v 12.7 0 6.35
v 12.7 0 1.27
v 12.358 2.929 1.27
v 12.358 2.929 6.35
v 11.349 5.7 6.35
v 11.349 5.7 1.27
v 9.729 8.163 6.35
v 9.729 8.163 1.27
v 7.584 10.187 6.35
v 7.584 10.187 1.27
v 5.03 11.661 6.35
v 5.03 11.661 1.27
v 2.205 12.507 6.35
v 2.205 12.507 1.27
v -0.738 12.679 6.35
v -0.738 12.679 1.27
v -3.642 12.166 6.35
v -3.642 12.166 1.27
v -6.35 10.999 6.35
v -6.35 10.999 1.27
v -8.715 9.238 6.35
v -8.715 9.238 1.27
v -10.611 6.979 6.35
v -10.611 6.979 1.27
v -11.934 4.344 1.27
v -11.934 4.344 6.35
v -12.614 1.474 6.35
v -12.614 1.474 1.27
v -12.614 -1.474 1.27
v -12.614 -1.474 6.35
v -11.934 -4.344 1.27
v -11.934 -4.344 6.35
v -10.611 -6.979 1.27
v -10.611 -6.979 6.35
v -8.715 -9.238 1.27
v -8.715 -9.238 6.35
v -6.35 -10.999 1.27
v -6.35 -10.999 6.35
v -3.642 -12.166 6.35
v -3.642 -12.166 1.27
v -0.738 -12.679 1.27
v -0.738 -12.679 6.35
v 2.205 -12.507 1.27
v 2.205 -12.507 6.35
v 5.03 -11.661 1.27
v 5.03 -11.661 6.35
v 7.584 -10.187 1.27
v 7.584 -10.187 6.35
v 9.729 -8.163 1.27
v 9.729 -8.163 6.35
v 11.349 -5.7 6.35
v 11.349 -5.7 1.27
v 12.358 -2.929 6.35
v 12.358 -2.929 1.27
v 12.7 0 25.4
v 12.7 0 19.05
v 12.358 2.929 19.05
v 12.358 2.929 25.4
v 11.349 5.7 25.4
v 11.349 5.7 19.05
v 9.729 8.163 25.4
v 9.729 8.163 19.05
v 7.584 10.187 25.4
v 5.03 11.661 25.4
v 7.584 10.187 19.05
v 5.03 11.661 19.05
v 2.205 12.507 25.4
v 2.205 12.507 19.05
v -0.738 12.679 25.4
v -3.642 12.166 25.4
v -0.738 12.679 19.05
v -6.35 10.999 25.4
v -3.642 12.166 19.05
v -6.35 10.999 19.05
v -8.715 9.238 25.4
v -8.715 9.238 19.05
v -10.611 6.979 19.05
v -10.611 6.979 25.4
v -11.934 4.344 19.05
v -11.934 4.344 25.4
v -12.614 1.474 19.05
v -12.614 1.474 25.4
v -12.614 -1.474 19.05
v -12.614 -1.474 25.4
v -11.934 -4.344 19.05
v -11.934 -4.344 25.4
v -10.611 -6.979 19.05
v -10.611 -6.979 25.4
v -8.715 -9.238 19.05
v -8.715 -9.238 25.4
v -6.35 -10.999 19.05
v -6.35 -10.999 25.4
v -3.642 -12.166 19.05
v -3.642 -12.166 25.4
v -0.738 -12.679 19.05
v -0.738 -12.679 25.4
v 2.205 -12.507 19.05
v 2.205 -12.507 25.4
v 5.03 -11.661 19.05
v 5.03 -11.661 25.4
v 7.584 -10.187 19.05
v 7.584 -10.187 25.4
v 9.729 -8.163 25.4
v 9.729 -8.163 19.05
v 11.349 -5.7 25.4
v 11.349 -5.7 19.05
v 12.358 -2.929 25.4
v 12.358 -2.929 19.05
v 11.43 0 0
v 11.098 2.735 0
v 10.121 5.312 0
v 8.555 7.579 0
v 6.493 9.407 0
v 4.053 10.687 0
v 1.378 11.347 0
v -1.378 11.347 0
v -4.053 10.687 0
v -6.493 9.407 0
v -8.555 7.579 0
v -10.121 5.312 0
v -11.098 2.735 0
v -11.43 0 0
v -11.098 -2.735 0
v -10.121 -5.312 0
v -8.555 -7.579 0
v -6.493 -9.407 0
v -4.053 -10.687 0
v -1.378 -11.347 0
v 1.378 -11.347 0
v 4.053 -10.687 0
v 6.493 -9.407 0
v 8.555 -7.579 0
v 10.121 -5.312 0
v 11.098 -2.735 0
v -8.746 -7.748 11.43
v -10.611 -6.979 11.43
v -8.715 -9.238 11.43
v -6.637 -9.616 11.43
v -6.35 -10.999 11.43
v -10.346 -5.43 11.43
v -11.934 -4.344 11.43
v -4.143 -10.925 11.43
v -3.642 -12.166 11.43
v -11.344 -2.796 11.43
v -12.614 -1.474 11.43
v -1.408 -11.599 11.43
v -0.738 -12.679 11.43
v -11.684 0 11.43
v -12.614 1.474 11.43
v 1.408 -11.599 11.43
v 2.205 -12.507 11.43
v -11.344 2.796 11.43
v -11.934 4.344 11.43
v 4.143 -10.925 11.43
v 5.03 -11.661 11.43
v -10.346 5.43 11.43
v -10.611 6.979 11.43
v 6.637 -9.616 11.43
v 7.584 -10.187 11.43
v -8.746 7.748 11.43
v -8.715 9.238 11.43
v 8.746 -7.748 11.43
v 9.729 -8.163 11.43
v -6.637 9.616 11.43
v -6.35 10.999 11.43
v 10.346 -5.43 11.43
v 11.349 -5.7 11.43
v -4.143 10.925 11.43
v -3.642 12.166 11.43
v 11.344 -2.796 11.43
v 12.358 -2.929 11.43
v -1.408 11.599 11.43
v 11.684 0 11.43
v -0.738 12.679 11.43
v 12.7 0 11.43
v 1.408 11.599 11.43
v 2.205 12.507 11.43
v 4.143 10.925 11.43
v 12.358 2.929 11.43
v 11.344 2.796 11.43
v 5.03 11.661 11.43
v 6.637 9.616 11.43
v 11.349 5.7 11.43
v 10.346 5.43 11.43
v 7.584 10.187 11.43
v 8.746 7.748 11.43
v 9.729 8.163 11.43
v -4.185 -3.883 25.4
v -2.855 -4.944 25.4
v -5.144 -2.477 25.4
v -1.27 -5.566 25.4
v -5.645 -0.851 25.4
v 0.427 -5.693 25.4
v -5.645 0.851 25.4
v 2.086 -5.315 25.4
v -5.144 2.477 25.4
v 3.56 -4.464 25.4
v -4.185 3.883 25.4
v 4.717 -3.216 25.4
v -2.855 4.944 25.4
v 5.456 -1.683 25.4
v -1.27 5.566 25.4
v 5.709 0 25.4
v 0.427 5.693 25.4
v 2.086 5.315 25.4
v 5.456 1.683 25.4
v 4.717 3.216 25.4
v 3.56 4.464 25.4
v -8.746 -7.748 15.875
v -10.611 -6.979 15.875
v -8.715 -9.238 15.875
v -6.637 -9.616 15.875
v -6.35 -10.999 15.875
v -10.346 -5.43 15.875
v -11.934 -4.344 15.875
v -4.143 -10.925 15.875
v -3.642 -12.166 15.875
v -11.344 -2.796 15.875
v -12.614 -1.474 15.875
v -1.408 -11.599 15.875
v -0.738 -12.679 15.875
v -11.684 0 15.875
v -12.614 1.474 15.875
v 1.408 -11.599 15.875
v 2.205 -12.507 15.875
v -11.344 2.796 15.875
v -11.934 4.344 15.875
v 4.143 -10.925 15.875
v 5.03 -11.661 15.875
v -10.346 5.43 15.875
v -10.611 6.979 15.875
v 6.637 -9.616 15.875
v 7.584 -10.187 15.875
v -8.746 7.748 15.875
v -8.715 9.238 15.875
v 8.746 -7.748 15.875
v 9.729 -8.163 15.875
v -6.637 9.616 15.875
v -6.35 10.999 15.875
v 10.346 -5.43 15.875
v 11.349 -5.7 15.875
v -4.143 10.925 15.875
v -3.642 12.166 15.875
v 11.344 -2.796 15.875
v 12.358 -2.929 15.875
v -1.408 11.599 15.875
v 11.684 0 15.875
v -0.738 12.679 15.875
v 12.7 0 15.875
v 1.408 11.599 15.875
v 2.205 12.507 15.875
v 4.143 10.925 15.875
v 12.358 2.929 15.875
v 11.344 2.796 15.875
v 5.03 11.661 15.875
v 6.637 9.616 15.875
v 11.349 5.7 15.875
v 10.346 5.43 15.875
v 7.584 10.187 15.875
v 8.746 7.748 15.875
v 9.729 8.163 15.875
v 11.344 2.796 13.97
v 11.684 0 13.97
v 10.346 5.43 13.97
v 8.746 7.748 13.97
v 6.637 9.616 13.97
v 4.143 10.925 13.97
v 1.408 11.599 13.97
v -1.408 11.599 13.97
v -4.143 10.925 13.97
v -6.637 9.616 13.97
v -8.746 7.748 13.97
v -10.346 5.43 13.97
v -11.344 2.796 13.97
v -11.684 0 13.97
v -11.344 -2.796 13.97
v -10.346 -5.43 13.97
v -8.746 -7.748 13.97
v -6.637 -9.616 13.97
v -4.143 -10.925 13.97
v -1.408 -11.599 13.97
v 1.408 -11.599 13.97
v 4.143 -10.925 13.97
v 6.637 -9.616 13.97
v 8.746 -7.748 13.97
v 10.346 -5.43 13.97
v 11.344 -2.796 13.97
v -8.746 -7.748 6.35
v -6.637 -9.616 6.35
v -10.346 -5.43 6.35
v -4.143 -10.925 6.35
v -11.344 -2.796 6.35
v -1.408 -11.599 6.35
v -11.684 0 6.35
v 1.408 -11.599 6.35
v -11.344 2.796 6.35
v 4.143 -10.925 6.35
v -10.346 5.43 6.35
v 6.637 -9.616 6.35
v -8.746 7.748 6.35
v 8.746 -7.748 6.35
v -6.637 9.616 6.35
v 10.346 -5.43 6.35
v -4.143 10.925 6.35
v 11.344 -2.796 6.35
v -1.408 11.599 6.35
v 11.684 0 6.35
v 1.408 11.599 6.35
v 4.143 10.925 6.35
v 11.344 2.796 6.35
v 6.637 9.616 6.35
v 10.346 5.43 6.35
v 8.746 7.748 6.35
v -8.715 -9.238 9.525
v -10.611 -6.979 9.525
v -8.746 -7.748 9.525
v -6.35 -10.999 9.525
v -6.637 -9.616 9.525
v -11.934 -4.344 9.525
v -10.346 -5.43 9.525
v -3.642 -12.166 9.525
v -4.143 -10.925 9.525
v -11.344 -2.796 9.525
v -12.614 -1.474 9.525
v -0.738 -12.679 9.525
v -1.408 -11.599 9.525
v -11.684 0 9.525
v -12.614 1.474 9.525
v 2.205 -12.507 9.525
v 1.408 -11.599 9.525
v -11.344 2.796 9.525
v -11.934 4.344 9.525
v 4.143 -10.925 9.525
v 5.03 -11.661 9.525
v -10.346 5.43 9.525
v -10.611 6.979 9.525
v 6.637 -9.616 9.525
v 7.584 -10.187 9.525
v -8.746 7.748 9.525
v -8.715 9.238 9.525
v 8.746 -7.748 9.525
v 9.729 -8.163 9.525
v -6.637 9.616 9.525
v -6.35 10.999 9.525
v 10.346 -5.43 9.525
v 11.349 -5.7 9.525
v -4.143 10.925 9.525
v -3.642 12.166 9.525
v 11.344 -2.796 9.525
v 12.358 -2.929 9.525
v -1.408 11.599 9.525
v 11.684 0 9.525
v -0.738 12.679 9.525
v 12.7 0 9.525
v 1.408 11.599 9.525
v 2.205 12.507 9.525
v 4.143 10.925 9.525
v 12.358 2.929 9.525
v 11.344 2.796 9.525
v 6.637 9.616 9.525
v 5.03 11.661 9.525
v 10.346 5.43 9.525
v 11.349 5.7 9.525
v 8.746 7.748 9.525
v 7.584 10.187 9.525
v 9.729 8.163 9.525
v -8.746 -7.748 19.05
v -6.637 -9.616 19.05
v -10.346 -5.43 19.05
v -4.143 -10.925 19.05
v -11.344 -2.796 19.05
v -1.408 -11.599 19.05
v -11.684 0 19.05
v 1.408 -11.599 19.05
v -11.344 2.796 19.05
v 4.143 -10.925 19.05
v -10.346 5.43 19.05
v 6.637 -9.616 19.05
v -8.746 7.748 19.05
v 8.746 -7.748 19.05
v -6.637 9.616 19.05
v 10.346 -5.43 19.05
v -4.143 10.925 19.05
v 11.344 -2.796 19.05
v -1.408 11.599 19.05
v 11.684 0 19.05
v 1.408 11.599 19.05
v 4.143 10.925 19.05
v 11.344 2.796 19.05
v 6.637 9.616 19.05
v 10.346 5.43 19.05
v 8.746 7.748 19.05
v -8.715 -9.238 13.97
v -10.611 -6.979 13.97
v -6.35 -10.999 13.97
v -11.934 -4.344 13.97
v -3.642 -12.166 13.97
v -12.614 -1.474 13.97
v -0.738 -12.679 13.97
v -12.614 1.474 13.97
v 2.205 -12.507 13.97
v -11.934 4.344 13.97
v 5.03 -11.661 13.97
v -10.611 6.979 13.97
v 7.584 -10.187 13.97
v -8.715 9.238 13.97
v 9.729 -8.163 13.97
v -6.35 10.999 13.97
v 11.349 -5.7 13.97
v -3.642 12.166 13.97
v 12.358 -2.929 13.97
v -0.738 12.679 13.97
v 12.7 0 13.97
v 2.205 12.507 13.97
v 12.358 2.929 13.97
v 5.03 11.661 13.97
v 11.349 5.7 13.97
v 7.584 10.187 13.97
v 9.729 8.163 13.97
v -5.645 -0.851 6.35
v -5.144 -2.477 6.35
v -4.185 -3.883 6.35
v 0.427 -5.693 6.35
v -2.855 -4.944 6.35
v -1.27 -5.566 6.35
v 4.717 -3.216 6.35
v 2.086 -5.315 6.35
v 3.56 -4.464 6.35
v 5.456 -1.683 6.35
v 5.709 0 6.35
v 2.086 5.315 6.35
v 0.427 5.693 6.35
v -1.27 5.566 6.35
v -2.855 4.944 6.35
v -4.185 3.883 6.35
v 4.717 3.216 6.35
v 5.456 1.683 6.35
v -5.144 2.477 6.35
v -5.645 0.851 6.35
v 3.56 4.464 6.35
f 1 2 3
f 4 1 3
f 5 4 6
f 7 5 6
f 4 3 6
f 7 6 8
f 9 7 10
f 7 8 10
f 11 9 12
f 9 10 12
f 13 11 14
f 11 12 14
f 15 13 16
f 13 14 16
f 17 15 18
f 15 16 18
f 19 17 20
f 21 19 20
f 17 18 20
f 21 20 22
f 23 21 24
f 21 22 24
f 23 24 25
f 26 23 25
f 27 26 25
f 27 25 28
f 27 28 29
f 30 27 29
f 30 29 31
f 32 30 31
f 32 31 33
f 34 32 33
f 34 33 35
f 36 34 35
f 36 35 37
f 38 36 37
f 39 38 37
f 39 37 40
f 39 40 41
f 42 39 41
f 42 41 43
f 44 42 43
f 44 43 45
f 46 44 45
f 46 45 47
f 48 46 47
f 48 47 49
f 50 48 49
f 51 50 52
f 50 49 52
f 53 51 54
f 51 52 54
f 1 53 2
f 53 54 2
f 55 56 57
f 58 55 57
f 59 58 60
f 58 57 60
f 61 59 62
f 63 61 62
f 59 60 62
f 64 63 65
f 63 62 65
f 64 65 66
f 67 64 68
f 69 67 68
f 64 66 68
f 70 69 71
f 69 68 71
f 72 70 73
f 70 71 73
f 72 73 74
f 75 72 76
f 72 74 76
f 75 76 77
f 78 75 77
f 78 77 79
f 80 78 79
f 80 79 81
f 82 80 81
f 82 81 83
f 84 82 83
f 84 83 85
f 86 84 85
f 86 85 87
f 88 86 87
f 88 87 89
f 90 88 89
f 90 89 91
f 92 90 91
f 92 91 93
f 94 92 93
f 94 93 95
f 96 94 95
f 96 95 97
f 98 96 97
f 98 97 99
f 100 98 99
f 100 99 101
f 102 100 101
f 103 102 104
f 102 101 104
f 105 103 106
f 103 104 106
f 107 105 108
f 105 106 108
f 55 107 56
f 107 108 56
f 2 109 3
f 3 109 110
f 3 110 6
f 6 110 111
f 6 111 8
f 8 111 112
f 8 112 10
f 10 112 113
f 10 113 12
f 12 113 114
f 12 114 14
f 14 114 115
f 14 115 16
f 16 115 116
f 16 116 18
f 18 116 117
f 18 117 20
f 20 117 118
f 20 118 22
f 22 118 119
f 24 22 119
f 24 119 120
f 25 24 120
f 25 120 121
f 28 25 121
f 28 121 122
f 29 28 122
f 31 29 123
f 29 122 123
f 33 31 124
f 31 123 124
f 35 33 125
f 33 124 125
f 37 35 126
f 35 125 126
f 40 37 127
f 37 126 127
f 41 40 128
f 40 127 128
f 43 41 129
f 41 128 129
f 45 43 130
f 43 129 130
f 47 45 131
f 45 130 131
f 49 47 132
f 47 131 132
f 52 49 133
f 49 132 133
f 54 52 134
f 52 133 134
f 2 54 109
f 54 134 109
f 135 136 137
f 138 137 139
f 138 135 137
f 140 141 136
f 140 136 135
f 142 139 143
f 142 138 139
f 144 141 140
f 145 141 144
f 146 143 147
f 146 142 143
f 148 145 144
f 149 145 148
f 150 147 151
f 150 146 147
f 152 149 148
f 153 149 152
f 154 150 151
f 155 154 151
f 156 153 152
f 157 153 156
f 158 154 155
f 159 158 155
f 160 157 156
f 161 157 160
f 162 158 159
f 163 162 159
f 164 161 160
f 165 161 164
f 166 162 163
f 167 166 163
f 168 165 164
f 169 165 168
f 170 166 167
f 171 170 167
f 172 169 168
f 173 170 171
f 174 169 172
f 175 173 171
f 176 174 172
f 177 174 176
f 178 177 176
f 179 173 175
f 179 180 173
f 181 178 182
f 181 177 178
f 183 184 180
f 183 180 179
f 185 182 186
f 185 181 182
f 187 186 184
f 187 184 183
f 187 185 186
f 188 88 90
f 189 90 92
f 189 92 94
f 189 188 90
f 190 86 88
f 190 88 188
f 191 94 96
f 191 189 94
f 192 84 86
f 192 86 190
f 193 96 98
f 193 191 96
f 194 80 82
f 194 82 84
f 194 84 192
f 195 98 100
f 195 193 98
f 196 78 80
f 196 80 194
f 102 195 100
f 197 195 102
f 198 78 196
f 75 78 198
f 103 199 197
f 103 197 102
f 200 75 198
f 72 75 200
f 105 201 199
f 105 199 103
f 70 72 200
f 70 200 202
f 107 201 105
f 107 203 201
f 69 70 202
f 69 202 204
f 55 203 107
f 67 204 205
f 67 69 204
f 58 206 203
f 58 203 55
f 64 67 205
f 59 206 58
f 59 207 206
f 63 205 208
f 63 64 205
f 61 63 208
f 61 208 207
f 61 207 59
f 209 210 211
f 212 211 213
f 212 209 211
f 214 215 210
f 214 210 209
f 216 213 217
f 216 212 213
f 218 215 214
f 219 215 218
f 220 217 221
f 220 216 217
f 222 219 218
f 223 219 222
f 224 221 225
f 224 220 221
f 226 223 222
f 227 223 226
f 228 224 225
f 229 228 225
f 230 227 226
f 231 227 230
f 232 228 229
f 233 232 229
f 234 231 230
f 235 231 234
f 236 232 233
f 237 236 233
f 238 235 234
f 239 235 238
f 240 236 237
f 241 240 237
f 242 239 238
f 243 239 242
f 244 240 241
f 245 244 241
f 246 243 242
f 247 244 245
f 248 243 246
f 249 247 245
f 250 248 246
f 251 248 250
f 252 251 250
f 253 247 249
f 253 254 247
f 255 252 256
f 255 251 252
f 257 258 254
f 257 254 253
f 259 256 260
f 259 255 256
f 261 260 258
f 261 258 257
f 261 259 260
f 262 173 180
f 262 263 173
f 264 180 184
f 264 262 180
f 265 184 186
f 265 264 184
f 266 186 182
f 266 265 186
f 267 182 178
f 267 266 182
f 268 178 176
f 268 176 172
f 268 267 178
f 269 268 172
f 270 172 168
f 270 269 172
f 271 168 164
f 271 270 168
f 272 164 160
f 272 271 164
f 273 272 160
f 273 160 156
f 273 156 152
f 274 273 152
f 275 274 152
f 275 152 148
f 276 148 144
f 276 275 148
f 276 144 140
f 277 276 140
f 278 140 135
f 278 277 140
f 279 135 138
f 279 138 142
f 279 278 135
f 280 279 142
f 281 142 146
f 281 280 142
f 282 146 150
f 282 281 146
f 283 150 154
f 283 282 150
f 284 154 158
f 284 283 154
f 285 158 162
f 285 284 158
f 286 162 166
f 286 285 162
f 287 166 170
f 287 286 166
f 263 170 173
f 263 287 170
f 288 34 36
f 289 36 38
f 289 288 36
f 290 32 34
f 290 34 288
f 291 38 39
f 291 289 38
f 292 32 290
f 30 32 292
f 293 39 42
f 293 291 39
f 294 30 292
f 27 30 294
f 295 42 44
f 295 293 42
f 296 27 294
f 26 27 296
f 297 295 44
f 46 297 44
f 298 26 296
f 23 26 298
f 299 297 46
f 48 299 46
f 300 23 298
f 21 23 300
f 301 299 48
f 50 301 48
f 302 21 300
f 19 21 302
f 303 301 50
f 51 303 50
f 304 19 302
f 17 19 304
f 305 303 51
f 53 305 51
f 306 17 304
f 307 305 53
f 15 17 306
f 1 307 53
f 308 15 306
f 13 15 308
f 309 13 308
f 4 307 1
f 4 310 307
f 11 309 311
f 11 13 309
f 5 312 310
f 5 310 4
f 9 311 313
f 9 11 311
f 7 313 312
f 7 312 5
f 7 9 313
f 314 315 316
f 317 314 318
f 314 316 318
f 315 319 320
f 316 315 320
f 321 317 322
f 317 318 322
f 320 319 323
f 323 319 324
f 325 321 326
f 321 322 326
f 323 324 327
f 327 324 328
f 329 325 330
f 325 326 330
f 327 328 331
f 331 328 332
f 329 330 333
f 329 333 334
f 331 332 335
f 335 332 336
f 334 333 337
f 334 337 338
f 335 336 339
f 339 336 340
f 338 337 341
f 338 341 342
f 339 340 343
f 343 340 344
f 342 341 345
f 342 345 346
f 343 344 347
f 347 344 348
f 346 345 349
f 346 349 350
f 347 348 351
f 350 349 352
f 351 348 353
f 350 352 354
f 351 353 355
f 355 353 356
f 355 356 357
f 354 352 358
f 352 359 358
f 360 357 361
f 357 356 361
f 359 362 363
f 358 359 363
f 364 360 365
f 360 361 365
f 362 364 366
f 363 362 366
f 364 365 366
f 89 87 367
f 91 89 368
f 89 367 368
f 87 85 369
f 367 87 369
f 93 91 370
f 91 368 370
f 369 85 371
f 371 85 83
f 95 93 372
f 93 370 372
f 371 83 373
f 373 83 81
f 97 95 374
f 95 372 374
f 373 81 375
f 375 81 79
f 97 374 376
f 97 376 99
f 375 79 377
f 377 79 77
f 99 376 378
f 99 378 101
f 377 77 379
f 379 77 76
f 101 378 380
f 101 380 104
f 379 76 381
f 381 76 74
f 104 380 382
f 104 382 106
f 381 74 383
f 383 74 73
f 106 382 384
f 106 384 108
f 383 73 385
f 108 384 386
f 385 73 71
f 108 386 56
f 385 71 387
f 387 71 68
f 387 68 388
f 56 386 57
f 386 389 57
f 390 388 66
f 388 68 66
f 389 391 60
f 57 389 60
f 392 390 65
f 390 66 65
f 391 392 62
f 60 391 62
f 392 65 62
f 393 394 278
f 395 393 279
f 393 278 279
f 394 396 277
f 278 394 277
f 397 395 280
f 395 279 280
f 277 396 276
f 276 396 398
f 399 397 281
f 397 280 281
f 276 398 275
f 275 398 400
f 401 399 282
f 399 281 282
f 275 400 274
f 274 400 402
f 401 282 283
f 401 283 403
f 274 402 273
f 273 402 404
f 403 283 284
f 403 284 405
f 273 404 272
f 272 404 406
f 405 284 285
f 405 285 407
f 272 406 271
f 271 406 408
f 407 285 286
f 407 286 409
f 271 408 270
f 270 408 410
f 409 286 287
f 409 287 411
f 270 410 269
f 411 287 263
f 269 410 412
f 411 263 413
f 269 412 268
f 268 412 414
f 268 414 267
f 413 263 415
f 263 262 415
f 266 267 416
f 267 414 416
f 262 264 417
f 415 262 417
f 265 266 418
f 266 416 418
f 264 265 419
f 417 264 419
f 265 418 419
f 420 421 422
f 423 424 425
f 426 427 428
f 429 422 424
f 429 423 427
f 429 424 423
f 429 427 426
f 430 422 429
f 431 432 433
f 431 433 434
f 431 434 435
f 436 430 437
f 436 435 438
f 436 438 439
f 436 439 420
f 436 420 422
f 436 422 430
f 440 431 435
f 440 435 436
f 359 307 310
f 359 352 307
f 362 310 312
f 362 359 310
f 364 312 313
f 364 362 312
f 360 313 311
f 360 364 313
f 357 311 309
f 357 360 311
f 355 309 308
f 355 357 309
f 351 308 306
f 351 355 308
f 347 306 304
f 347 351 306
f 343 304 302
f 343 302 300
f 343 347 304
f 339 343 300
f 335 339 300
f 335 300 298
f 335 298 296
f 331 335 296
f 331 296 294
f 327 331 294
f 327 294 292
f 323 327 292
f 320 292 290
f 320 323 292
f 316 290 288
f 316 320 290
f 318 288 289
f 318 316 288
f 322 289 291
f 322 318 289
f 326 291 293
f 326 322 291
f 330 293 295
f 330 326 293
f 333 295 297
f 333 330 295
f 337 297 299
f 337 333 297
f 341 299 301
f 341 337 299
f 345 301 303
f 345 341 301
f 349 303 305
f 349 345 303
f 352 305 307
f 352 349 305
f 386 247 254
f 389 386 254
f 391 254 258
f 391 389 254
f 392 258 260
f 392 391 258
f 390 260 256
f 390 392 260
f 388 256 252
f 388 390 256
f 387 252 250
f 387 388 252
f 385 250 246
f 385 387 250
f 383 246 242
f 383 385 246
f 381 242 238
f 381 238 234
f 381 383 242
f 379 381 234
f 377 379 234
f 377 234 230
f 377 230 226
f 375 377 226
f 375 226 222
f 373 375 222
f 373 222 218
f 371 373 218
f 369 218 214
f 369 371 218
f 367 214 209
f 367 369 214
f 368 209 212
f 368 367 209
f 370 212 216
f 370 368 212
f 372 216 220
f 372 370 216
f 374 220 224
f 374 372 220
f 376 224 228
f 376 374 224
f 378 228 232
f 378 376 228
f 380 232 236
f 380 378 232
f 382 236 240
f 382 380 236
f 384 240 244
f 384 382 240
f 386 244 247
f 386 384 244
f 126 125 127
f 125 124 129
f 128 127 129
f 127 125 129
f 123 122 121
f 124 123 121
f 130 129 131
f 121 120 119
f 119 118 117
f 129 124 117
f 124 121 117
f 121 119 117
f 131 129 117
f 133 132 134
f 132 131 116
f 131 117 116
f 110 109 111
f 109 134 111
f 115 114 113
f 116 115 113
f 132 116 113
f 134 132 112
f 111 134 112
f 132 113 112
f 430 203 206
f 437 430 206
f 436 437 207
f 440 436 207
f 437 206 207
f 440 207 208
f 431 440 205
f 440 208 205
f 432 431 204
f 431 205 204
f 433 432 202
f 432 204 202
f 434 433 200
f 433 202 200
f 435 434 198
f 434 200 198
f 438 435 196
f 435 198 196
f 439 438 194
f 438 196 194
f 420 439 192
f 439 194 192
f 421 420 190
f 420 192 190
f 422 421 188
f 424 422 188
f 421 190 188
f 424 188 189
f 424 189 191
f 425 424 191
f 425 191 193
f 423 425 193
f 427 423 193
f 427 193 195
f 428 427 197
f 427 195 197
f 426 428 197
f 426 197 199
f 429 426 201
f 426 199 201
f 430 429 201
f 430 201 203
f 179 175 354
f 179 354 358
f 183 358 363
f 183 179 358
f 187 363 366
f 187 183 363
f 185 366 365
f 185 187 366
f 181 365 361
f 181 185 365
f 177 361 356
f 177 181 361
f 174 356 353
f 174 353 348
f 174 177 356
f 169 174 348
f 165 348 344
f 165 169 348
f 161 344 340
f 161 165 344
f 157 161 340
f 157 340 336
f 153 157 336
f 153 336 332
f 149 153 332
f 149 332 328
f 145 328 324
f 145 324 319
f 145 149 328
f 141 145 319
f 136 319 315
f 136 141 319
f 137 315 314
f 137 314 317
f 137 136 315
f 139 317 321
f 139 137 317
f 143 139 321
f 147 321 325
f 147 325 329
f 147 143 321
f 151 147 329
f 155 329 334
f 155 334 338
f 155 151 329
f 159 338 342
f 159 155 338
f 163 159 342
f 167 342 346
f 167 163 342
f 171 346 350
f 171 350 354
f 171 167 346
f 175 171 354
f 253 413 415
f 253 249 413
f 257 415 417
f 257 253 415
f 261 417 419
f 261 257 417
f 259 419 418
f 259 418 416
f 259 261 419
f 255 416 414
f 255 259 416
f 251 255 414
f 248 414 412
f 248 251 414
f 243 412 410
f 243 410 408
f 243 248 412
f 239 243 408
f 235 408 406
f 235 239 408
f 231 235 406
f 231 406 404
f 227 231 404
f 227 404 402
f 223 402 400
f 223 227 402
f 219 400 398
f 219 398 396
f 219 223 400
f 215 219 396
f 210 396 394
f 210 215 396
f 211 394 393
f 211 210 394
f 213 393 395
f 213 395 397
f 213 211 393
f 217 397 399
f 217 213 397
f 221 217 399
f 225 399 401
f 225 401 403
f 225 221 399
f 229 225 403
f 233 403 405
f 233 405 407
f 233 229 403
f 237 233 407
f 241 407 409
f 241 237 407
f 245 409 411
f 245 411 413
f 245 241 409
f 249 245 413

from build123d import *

# Parameters (mm, degrees)
F0_R          = 12.7
F1_DEPTH      = 25.4
F2_R          = 5.7092426067
F3_DEPTH      = 19.05
F5_R          = 12.7
F5_R_2        = 11.6839995608
F6_DEPTH      = 6.35
F6_DEPTH_BACK = 6.35
F7_DEPTH      = 3.175
F7_DEPTH_BACK = 3.175
F8_DEPTH      = 1.27
F8_DEPTH_BACK = 1.27
F9_SIZE       = 1.27


with BuildPart() as f1:
    # F0 (on Top) → F1 (new body)
    with BuildSketch(Plane.XY):
        Circle(F0_R)
    extrude(amount=F1_DEPTH)

    # F2 (on face) → F3 (cut)
    with BuildSketch(Plane.XY.offset(25.4)):
        Circle(F2_R)
    extrude(amount=-F3_DEPTH, mode=Mode.SUBTRACT)

    # F5 (on offset) → F6 (cut, two sides)
    with BuildSketch(Plane.XY.offset(12.7)) as f6_sk:
        Circle(F5_R)
        Circle(F5_R_2, mode=Mode.SUBTRACT)
    extrude(amount=-F6_DEPTH, mode=Mode.SUBTRACT)
    extrude(f6_sk.sketch, amount=F6_DEPTH_BACK, mode=Mode.SUBTRACT)

    # F5 (on offset) → F7 (join, two sides)
    with BuildSketch(Plane.XY.offset(12.7)) as f7_sk:
        Circle(F5_R)
        Circle(F5_R_2, mode=Mode.SUBTRACT)
    extrude(amount=F7_DEPTH)
    extrude(f7_sk.sketch, amount=-F7_DEPTH_BACK)

    # F5 (on offset) → F8 (cut, two sides)
    with BuildSketch(Plane.XY.offset(12.7)) as f8_sk:
        Circle(F5_R)
        Circle(F5_R_2, mode=Mode.SUBTRACT)
    extrude(amount=-F8_DEPTH, mode=Mode.SUBTRACT)
    extrude(f8_sk.sketch, amount=F8_DEPTH_BACK, mode=Mode.SUBTRACT)

    # F9
    f9_edges = [f1.edges().sort_by_distance(p)[0] for p in [
        (-12.7, 0, 0),
    ]]
    chamfer(f9_edges, length=F9_SIZE)


solid = f1.part
